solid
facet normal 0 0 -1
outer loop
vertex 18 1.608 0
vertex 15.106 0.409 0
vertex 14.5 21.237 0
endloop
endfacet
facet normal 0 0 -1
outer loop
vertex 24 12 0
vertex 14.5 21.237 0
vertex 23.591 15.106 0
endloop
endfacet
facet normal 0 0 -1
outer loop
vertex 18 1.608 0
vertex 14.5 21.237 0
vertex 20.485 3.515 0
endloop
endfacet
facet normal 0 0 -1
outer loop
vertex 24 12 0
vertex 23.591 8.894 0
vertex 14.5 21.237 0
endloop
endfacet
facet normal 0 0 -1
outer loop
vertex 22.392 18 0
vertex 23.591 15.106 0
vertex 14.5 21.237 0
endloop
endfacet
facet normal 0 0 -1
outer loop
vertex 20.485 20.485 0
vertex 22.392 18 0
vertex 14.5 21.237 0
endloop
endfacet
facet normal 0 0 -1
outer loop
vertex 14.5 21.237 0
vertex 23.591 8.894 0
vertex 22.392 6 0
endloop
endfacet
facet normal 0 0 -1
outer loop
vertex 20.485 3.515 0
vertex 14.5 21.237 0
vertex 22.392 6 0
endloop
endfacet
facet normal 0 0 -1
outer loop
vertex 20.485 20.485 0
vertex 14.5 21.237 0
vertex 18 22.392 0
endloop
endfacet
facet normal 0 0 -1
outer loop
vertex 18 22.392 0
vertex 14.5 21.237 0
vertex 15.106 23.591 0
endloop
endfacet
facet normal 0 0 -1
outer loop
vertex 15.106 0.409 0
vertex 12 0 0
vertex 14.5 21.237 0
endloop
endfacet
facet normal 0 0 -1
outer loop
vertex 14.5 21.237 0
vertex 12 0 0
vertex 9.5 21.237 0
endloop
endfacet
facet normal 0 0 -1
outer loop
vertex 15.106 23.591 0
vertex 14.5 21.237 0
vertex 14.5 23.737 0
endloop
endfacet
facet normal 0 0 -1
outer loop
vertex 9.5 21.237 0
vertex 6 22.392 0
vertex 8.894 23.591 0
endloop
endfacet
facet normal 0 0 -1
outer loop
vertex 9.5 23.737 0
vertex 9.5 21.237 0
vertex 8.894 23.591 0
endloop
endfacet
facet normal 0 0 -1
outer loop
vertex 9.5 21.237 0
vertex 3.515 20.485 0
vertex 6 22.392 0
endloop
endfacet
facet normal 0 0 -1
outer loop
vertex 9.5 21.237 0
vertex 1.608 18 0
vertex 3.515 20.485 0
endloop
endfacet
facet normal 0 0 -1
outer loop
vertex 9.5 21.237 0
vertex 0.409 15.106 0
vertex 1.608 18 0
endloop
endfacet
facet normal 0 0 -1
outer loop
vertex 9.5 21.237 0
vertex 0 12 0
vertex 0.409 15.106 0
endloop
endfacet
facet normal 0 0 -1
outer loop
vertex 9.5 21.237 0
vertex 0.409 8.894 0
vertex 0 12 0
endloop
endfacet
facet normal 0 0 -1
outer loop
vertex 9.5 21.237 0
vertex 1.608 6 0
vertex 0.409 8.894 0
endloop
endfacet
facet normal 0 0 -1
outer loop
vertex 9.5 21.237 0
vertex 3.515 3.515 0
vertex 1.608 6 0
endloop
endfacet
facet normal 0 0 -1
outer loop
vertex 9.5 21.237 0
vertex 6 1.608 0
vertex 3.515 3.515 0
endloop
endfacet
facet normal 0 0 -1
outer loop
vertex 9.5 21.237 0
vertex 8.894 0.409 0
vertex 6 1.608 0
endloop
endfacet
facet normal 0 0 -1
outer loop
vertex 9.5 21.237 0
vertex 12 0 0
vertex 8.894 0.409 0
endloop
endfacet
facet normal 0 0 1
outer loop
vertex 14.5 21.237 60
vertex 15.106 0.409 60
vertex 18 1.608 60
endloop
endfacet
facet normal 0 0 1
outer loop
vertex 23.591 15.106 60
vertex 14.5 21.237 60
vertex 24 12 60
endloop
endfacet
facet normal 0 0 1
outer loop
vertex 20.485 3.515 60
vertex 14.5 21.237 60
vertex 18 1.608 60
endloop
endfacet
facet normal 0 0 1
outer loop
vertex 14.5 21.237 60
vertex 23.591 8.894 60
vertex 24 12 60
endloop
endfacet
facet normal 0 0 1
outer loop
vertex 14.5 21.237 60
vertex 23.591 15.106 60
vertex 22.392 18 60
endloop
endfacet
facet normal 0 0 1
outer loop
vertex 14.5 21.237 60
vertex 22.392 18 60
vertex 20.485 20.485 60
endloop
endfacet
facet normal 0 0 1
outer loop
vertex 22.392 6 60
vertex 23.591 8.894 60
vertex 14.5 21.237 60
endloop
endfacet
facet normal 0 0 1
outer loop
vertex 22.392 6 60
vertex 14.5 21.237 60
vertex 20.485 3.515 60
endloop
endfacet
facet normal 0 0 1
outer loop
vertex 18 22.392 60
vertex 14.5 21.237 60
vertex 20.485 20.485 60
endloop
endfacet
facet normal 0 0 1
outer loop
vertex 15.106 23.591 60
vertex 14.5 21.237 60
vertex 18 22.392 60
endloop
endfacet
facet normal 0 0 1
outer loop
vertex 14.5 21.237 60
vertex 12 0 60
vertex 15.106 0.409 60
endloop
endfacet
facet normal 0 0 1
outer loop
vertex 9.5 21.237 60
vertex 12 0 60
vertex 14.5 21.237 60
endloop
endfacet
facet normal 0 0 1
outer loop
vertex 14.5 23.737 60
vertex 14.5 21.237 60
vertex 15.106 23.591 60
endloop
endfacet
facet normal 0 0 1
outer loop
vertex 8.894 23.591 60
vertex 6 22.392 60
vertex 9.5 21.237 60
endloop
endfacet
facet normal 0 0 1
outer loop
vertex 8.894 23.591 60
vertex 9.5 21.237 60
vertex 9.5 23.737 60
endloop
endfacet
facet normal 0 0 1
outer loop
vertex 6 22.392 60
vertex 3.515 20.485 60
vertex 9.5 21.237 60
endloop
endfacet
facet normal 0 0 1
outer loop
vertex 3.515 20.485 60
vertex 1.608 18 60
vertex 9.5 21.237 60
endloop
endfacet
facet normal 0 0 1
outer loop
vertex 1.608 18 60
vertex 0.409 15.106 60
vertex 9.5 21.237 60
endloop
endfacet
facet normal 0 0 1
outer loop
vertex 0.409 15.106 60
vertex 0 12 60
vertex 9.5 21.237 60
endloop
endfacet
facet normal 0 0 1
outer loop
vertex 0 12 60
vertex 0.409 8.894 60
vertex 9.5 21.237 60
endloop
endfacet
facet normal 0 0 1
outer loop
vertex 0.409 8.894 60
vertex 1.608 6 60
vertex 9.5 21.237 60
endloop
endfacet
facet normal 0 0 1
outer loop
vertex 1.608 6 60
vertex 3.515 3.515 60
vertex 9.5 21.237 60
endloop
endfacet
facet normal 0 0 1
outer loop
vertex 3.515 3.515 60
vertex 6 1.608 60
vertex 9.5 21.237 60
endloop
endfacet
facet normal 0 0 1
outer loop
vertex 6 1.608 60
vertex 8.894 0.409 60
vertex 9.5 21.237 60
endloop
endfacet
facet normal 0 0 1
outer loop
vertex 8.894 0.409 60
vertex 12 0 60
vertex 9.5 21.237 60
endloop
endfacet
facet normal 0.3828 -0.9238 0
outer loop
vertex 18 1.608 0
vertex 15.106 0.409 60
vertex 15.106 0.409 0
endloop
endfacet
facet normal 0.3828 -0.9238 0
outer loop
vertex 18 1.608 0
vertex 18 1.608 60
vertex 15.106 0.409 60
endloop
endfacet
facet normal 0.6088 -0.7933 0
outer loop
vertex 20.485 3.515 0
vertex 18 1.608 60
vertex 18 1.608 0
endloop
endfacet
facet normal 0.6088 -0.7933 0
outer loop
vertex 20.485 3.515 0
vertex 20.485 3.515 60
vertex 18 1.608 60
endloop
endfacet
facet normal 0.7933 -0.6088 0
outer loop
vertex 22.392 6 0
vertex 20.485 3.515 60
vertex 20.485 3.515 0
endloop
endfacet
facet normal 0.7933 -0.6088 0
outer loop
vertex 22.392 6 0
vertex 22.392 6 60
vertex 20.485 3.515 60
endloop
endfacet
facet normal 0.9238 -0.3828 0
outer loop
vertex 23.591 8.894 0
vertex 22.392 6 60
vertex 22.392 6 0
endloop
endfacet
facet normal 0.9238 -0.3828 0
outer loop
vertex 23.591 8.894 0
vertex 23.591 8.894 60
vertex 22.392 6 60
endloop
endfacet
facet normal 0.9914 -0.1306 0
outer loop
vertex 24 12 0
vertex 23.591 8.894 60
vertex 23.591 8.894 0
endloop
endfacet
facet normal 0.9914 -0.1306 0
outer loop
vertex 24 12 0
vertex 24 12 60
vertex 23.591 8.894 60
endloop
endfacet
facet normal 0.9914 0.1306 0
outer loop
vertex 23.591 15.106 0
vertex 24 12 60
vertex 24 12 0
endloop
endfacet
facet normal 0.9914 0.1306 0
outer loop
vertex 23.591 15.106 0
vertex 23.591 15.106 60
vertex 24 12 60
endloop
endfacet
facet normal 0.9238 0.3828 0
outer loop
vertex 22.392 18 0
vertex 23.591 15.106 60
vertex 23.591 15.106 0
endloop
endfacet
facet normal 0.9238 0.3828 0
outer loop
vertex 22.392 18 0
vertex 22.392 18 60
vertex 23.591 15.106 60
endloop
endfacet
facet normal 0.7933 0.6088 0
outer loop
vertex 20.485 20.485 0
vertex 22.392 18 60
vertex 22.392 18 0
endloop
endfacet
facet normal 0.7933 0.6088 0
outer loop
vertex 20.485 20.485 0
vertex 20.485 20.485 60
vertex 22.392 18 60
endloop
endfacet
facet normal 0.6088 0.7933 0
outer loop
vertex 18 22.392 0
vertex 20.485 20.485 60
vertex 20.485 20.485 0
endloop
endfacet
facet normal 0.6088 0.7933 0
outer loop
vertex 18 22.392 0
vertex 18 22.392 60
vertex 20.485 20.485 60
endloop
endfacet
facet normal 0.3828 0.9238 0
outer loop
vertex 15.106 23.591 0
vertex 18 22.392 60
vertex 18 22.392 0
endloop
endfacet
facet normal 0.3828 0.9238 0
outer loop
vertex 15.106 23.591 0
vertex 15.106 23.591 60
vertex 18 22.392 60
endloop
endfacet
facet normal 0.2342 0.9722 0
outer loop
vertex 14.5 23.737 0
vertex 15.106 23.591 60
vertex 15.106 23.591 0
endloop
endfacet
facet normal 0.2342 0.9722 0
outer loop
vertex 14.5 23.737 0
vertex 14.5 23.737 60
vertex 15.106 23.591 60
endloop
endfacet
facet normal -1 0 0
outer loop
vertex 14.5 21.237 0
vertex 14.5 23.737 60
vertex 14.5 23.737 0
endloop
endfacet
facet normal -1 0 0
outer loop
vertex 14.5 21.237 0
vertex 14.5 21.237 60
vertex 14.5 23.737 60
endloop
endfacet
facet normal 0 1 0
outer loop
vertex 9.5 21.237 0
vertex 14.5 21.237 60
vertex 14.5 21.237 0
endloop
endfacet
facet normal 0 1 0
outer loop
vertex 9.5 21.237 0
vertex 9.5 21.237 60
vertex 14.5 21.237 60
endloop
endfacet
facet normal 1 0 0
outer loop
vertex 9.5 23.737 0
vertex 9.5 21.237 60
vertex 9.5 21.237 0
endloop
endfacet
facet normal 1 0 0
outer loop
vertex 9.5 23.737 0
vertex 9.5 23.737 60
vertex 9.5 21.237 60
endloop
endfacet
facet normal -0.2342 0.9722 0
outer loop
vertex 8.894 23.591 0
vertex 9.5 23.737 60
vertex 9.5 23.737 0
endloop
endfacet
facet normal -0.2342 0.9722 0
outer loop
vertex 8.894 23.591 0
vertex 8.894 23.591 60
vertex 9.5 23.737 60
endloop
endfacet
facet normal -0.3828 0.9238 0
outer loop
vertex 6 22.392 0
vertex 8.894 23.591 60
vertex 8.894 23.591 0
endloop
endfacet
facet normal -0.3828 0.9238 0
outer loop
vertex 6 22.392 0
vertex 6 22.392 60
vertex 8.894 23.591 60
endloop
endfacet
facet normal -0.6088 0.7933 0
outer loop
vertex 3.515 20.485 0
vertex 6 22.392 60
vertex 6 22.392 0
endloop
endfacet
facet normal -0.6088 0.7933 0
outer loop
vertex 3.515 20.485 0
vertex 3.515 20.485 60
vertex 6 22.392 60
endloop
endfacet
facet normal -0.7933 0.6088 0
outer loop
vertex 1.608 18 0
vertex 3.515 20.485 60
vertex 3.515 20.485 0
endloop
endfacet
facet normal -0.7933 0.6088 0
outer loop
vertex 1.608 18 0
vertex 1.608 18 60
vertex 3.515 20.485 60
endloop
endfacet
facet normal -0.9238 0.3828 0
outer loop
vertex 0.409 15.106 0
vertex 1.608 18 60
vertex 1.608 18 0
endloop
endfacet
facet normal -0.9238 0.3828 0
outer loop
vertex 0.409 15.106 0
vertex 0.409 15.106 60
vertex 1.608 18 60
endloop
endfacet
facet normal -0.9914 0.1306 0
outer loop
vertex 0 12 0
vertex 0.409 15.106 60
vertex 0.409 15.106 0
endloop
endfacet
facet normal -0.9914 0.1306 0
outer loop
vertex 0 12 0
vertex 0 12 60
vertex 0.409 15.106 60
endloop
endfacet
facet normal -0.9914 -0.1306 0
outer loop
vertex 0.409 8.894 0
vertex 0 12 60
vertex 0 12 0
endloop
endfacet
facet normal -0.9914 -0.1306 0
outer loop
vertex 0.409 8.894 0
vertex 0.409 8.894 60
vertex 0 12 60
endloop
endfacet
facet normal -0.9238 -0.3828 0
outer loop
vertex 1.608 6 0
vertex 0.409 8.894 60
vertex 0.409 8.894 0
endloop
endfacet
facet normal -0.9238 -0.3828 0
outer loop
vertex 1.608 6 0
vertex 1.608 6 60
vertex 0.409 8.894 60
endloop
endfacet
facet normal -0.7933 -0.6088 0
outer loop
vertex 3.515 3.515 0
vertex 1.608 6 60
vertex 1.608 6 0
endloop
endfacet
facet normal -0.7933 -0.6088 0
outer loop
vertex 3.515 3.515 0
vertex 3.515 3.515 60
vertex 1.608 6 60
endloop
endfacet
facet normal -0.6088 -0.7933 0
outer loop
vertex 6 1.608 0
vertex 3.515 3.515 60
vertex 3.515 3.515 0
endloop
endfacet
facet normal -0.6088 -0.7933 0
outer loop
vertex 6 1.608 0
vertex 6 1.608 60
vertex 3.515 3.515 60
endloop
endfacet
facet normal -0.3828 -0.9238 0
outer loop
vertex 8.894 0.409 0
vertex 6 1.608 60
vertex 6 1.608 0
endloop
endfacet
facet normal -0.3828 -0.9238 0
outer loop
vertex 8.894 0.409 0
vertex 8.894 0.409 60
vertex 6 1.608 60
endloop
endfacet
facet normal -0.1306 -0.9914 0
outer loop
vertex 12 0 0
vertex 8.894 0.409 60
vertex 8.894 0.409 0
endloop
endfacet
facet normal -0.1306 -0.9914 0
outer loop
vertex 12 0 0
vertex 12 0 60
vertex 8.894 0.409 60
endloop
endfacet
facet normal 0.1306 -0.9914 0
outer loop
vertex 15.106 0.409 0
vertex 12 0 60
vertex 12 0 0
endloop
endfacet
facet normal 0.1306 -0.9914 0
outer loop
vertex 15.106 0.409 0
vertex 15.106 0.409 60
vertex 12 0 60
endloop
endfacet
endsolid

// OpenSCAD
$fn = 32;

// ----------------------------------------------------------------------
// Keyway shaft: d24 shaft, key 5 x 2.5 mm
// ----------------------------------------------------------------------

// --- parameters (mm) ---
shaft_r = 12;             // shaft radius
key_w = 5;                // keyway width
key_d = 2.5;              // keyway depth below the surface line
plate_t = 60;             // shaft length, Z (extrusion height)
fit_tol = 0.02;           // declared fit tolerance (prompt contract)
free_tol = 0.2;           // declared free tolerance (prompt contract)

shaft_d = 2 * shaft_r;  // shaft diameter
circle_step = 15;  // polygon sampling step, degrees

profile = [[8.894, 23.591], [6, 22.392], [3.515, 20.485], [1.608, 18], [0.409, 15.106], [0, 12], [0.409, 8.894], [1.608, 6], [3.515, 3.515], [6, 1.608], [8.894, 0.409], [12, 0], [15.106, 0.409], [18, 1.608], [20.485, 3.515], [22.392, 6], [23.591, 8.894], [24, 12], [23.591, 15.106], [22.392, 18], [20.485, 20.485], [18, 22.392], [15.106, 23.591], [14.5, 23.737], [14.5, 21.237], [9.5, 21.237], [9.5, 23.737]];  // primary outline, 27 points, counter clockwise

// --- the one profile operation ---
linear_extrude(height = plate_t) polygon(points = profile);
